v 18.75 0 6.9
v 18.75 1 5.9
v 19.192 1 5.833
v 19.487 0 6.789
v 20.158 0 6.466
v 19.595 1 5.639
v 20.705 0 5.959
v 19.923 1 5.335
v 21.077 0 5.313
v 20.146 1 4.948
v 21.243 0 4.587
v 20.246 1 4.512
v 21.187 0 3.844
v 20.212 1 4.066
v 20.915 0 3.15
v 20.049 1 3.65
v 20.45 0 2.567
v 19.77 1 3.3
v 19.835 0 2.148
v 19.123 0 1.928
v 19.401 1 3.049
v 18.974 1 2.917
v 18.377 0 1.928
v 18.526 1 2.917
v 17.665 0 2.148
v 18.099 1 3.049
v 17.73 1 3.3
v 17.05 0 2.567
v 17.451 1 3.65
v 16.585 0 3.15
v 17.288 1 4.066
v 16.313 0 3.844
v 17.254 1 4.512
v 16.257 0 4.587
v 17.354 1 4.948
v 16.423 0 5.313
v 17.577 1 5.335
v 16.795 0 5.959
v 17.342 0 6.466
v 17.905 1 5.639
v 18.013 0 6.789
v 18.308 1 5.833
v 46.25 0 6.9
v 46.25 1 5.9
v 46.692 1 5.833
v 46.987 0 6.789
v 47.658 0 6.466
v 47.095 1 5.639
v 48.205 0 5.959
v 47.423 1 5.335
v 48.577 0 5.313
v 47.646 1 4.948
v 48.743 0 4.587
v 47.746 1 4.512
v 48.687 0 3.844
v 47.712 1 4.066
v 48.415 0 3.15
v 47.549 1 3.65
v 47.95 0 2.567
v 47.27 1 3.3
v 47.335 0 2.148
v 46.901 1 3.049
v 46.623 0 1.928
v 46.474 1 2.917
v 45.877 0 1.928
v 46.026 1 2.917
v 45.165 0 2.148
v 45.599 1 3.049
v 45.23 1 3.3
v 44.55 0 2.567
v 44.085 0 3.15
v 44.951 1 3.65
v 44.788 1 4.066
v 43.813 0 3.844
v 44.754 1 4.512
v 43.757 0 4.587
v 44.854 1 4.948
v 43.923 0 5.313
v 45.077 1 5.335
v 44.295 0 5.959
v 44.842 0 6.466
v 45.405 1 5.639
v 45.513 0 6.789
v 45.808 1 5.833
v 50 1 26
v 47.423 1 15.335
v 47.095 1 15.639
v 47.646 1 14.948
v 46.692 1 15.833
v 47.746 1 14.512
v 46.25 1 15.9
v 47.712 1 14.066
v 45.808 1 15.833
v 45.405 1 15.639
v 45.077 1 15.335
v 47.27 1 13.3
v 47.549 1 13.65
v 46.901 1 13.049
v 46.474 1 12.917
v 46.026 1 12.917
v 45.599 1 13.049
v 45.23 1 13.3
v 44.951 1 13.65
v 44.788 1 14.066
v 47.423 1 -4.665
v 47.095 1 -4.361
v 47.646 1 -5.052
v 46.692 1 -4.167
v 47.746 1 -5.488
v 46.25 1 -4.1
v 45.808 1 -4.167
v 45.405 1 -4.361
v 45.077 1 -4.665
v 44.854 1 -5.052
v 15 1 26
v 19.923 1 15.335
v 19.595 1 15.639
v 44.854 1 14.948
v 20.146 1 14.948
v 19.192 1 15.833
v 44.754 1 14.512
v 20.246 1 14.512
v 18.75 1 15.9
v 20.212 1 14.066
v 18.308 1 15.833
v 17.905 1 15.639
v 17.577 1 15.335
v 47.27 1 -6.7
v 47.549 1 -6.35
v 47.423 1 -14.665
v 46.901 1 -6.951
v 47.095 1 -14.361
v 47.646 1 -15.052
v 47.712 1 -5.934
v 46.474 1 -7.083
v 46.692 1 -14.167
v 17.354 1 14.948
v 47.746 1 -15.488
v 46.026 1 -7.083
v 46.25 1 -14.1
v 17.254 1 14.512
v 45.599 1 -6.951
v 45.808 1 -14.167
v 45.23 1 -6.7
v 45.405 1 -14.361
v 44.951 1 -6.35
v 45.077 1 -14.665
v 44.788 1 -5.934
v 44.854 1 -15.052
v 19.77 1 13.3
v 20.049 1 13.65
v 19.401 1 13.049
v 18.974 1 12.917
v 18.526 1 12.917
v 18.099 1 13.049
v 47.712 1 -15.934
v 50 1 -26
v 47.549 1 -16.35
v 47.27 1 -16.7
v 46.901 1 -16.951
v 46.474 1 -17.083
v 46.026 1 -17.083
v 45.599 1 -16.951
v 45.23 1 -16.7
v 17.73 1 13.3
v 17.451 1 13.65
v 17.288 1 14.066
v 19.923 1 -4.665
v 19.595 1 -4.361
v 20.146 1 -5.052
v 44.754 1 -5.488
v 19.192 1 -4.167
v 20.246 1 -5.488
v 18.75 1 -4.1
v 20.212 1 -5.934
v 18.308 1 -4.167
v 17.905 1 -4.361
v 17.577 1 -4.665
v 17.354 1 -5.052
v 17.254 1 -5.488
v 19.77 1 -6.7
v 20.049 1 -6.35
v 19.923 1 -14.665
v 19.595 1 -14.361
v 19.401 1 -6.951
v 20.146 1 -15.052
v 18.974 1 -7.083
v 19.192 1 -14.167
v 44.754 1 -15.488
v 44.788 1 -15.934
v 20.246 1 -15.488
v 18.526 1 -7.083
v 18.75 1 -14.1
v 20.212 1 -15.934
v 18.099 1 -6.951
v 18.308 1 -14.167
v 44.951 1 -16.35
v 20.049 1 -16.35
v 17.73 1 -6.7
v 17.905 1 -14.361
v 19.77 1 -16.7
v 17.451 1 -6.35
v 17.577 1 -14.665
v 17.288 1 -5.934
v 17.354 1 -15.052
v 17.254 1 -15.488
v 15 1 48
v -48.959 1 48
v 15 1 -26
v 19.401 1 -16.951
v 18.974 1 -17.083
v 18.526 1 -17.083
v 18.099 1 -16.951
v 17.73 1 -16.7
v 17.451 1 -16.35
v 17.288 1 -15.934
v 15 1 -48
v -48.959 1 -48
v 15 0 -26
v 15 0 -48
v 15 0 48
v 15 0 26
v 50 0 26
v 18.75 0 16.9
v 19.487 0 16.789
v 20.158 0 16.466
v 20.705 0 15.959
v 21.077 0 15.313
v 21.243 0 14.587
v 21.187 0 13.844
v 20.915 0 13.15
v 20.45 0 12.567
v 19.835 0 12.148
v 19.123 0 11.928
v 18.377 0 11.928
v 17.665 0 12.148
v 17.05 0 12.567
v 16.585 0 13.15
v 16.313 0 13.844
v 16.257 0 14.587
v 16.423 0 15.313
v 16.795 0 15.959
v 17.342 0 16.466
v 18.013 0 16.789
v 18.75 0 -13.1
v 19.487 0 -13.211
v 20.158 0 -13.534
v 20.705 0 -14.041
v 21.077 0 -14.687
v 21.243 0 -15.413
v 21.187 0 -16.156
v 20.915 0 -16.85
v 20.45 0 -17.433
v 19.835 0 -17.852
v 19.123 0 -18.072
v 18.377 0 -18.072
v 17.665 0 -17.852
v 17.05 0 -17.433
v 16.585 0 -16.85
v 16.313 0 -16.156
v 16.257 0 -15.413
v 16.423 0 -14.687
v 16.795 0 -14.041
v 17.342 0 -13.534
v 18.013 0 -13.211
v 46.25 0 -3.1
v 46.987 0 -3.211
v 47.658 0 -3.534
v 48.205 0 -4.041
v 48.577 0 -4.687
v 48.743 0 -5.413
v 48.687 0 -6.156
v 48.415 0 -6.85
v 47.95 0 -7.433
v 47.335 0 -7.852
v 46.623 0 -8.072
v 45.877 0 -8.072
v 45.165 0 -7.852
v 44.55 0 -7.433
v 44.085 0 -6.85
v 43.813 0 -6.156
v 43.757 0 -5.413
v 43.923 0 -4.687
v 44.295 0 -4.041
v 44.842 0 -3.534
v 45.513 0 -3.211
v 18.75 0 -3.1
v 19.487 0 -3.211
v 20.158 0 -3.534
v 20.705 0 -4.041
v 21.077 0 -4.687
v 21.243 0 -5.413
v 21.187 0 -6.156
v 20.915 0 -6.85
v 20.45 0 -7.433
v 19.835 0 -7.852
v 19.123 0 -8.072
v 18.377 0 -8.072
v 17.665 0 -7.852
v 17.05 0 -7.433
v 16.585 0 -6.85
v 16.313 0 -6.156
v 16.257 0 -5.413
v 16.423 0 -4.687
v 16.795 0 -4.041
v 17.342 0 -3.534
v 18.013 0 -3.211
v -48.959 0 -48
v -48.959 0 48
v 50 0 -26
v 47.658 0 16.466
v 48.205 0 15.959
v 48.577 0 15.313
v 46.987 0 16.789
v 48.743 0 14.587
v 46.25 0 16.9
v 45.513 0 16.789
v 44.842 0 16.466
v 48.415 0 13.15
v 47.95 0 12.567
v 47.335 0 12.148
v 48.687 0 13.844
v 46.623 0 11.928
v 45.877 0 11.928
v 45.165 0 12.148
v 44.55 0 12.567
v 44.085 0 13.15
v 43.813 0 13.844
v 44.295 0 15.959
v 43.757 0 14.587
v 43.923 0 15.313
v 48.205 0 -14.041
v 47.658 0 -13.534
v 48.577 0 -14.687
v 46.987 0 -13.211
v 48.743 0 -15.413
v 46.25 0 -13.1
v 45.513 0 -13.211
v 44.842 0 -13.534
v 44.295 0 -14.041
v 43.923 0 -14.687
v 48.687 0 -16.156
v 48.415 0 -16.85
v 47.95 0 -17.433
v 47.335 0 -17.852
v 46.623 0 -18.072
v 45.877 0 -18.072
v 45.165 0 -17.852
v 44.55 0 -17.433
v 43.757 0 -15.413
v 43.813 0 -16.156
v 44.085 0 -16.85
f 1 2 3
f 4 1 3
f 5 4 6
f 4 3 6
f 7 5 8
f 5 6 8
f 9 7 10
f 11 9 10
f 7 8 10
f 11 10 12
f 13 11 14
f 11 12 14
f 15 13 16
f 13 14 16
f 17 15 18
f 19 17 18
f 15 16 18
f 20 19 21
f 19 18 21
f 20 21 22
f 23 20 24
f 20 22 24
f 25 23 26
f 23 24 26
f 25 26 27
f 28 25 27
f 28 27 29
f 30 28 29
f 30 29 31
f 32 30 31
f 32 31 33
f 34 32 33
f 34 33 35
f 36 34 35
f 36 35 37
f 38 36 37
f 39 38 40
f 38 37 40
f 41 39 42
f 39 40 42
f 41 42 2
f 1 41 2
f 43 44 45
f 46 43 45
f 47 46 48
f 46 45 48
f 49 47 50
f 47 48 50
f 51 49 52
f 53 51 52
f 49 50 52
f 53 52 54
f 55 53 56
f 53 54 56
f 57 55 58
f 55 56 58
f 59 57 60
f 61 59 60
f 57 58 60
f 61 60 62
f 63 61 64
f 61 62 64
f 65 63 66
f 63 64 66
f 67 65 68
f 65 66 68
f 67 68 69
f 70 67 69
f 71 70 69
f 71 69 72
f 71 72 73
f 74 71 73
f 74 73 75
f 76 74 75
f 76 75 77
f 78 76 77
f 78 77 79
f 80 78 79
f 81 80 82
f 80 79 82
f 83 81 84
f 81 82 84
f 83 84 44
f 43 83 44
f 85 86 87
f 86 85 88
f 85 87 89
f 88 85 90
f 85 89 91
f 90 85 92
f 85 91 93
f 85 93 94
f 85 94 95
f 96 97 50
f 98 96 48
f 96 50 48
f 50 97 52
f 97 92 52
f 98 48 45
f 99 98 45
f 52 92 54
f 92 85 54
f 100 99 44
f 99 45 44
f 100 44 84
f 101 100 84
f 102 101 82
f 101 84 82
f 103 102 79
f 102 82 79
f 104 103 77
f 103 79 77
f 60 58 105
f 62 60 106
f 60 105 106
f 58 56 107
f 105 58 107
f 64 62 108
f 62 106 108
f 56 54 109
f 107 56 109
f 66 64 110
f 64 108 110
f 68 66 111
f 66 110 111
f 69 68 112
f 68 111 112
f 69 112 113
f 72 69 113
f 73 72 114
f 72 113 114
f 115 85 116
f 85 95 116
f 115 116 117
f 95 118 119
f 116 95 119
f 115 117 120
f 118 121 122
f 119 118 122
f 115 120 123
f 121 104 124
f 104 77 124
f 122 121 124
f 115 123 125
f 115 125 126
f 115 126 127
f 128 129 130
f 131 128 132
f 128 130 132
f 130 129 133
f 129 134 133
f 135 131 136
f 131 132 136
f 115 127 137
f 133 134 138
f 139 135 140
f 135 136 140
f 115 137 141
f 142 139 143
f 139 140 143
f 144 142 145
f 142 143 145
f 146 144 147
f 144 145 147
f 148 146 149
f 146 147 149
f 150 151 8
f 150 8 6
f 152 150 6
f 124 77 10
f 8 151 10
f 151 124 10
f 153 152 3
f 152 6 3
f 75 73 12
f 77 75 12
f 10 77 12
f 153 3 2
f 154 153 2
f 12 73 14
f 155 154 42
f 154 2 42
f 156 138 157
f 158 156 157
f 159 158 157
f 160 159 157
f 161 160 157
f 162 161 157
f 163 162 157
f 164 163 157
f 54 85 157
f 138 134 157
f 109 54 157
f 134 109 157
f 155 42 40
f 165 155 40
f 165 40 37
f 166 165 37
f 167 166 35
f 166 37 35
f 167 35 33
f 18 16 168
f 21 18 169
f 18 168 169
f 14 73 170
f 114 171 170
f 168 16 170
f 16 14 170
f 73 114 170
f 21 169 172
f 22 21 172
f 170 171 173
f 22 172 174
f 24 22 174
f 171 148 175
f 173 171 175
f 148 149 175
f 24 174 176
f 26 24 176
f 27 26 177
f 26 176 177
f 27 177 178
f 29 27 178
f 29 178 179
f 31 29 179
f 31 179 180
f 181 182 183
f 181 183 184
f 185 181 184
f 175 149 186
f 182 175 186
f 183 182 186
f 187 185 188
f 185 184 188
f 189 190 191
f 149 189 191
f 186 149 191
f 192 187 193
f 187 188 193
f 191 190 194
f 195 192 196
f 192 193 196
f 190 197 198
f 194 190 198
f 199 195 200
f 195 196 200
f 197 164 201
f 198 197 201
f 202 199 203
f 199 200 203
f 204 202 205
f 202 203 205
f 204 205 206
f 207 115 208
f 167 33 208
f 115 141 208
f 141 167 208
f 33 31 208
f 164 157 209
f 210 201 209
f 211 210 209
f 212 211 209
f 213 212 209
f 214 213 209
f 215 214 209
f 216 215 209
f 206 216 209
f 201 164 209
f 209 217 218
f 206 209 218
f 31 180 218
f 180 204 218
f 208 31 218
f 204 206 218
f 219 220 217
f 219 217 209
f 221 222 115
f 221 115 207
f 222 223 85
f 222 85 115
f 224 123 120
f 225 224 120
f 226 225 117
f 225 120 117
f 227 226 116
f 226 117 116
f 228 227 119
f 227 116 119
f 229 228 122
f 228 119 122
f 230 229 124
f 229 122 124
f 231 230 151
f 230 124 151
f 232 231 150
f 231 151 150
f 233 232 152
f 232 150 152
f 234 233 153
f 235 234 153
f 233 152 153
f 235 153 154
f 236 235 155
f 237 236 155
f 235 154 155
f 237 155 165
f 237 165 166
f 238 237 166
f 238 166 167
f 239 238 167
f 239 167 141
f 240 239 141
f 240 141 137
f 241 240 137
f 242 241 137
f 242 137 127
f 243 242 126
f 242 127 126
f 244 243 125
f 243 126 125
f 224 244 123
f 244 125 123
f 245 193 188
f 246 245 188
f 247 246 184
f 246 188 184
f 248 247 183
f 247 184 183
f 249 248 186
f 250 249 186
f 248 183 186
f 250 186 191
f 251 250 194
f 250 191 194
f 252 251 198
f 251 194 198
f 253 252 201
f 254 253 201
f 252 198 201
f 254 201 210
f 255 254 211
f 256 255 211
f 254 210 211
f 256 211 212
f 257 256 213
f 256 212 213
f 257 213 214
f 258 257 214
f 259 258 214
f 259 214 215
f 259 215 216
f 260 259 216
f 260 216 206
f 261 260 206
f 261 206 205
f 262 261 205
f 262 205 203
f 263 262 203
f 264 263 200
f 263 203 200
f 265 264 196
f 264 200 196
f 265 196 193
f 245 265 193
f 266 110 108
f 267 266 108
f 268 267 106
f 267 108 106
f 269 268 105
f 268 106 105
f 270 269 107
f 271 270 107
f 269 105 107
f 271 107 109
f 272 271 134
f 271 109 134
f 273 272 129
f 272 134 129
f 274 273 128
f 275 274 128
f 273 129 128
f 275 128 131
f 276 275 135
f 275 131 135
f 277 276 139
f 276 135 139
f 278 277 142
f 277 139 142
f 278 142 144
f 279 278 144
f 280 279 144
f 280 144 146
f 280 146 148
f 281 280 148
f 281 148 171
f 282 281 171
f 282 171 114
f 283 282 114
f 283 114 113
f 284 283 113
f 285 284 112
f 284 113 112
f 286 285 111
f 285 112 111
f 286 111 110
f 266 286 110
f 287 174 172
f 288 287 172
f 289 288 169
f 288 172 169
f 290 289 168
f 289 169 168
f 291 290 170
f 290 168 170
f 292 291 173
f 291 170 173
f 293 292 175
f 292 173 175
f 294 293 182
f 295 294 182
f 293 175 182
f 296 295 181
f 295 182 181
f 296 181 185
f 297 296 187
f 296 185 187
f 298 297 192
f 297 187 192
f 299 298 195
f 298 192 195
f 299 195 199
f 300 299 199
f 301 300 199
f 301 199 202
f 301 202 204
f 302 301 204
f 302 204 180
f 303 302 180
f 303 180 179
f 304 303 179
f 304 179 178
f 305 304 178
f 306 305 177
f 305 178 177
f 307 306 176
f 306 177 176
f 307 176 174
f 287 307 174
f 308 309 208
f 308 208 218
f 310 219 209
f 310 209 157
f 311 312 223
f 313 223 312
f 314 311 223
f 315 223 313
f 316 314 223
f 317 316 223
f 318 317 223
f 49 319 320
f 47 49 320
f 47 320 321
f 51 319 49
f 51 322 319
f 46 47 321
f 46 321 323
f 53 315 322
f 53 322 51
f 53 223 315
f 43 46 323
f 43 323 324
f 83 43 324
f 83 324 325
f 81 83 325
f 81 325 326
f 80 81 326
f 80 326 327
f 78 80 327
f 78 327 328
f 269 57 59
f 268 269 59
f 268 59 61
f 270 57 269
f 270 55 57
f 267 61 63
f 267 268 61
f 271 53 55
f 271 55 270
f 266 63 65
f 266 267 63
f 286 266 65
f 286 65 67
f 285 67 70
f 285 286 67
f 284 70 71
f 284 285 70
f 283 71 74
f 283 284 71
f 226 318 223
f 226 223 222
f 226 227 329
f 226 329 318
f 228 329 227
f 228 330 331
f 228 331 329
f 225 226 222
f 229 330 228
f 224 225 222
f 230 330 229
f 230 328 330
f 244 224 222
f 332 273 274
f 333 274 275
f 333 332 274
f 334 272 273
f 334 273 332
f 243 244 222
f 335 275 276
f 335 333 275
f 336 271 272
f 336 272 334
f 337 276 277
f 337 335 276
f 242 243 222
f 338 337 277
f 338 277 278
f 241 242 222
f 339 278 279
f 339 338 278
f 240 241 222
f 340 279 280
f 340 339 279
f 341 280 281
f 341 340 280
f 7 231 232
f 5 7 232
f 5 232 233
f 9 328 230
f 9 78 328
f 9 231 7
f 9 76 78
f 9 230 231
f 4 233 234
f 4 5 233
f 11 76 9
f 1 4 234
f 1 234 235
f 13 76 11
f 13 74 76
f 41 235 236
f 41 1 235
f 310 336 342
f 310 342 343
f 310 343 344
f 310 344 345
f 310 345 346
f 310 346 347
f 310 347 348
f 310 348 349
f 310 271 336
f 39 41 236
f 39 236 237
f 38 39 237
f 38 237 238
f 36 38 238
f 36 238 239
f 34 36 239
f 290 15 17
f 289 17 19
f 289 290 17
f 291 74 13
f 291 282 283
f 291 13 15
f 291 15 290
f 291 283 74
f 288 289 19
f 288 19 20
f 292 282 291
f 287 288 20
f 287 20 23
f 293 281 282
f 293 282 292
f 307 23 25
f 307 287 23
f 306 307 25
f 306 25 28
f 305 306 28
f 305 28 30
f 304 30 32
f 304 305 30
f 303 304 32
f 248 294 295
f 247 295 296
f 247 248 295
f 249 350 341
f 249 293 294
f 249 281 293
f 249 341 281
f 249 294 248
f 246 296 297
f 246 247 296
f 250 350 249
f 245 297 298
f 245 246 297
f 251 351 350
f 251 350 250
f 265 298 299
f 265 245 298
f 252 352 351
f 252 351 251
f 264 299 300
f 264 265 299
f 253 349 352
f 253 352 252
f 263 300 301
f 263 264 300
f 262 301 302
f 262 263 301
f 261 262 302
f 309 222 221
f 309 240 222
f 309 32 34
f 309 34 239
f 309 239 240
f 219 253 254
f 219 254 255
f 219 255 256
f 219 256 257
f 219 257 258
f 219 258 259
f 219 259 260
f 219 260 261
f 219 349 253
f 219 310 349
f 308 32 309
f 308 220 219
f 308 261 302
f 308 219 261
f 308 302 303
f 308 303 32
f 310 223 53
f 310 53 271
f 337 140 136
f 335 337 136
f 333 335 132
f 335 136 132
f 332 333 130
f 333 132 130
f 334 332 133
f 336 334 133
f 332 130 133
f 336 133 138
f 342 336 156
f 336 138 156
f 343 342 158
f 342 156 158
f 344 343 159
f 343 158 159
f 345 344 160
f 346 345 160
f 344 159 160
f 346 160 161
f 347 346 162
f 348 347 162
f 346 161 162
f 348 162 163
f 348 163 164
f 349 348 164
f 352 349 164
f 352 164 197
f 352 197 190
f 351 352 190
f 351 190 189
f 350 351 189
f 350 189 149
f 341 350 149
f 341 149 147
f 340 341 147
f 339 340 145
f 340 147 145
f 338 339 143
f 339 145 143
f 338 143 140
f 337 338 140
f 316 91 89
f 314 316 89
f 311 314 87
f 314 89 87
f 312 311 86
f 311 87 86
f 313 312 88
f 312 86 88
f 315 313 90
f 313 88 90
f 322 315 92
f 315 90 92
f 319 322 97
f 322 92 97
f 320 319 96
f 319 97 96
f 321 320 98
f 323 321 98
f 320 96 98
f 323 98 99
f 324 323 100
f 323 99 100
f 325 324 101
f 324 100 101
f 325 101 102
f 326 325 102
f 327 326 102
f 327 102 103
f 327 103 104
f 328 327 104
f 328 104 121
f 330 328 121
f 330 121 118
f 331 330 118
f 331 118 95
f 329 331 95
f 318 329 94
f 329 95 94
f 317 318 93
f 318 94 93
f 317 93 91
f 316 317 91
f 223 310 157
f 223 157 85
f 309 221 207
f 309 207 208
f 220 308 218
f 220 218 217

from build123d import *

# Parameters (mm, degrees)
EXTRUDE_1_DEPTH     = 1
SKETCH_2_R          = 1.5
CUT_EXTRUDE_1_DEPTH = 10
CHAMFER_1_SIZE      = 1


with BuildPart() as part:
    # Эскиз1 → Бобышка-Вытянуть1 (new body)
    with BuildSketch(Plane(origin=(0, 0, 0), x_dir=(1, 0, 0), z_dir=(0, 1, 0))):
        Polygon((15, -26), (15, -48), (-48.959081244, -48), (-48.959081244, 48), (15, 48), (15, 26), (50, 26), (50, -26), align=None)
    extrude(amount=EXTRUDE_1_DEPTH)

    # Эскиз2 → Вырез-Вытянуть1 (cut)
    with BuildSketch(Plane(origin=(0, 1, 0), x_dir=(1, 0, 0), z_dir=(0, 1, 0))):
        with Locations(Location((46.25, -14.4, 0), (0, 0, 270))):
            Circle(SKETCH_2_R)
        with Locations(Location((18.75, -14.4, 0), (0, 0, 270))):
            Circle(SKETCH_2_R)
        with Locations(Location((18.75, -4.4, 0), (0, 0, 270))):
            Circle(SKETCH_2_R)
        with Locations(Location((46.25, -4.4, 0), (0, 0, 270))):
            Circle(SKETCH_2_R)
        with Locations(Location((18.75, 5.6, 0), (0, 0, 270))):
            Circle(SKETCH_2_R)
        with Locations(Location((46.25, 5.6, 0), (0, 0, 270))):
            Circle(SKETCH_2_R)
        with Locations(Location((18.75, 15.6, 0), (0, 0, 270))):
            Circle(SKETCH_2_R)
        with Locations(Location((46.25, 15.6, 0), (0, 0, 270))):
            Circle(SKETCH_2_R)
    extrude(amount=-CUT_EXTRUDE_1_DEPTH, mode=Mode.SUBTRACT)

    # Фаска1
    chamfer_1_edges = [part.edges().sort_by_distance(p)[0] for p in [
        (46.25, 0, -7.1),
        (18.75, 0, 2.9),
        (46.25, 0, 2.9),
        (18.75, 0, 12.9),
        (18.75, 0, -17.1),
        (46.25, 0, -17.1),
        (18.75, 0, -7.1),
        (46.25, 0, 12.9),
    ]]
    chamfer(chamfer_1_edges, length=CHAMFER_1_SIZE - 0.0001)  # a hair under: the kernel refuses the full size


solid = part.part
